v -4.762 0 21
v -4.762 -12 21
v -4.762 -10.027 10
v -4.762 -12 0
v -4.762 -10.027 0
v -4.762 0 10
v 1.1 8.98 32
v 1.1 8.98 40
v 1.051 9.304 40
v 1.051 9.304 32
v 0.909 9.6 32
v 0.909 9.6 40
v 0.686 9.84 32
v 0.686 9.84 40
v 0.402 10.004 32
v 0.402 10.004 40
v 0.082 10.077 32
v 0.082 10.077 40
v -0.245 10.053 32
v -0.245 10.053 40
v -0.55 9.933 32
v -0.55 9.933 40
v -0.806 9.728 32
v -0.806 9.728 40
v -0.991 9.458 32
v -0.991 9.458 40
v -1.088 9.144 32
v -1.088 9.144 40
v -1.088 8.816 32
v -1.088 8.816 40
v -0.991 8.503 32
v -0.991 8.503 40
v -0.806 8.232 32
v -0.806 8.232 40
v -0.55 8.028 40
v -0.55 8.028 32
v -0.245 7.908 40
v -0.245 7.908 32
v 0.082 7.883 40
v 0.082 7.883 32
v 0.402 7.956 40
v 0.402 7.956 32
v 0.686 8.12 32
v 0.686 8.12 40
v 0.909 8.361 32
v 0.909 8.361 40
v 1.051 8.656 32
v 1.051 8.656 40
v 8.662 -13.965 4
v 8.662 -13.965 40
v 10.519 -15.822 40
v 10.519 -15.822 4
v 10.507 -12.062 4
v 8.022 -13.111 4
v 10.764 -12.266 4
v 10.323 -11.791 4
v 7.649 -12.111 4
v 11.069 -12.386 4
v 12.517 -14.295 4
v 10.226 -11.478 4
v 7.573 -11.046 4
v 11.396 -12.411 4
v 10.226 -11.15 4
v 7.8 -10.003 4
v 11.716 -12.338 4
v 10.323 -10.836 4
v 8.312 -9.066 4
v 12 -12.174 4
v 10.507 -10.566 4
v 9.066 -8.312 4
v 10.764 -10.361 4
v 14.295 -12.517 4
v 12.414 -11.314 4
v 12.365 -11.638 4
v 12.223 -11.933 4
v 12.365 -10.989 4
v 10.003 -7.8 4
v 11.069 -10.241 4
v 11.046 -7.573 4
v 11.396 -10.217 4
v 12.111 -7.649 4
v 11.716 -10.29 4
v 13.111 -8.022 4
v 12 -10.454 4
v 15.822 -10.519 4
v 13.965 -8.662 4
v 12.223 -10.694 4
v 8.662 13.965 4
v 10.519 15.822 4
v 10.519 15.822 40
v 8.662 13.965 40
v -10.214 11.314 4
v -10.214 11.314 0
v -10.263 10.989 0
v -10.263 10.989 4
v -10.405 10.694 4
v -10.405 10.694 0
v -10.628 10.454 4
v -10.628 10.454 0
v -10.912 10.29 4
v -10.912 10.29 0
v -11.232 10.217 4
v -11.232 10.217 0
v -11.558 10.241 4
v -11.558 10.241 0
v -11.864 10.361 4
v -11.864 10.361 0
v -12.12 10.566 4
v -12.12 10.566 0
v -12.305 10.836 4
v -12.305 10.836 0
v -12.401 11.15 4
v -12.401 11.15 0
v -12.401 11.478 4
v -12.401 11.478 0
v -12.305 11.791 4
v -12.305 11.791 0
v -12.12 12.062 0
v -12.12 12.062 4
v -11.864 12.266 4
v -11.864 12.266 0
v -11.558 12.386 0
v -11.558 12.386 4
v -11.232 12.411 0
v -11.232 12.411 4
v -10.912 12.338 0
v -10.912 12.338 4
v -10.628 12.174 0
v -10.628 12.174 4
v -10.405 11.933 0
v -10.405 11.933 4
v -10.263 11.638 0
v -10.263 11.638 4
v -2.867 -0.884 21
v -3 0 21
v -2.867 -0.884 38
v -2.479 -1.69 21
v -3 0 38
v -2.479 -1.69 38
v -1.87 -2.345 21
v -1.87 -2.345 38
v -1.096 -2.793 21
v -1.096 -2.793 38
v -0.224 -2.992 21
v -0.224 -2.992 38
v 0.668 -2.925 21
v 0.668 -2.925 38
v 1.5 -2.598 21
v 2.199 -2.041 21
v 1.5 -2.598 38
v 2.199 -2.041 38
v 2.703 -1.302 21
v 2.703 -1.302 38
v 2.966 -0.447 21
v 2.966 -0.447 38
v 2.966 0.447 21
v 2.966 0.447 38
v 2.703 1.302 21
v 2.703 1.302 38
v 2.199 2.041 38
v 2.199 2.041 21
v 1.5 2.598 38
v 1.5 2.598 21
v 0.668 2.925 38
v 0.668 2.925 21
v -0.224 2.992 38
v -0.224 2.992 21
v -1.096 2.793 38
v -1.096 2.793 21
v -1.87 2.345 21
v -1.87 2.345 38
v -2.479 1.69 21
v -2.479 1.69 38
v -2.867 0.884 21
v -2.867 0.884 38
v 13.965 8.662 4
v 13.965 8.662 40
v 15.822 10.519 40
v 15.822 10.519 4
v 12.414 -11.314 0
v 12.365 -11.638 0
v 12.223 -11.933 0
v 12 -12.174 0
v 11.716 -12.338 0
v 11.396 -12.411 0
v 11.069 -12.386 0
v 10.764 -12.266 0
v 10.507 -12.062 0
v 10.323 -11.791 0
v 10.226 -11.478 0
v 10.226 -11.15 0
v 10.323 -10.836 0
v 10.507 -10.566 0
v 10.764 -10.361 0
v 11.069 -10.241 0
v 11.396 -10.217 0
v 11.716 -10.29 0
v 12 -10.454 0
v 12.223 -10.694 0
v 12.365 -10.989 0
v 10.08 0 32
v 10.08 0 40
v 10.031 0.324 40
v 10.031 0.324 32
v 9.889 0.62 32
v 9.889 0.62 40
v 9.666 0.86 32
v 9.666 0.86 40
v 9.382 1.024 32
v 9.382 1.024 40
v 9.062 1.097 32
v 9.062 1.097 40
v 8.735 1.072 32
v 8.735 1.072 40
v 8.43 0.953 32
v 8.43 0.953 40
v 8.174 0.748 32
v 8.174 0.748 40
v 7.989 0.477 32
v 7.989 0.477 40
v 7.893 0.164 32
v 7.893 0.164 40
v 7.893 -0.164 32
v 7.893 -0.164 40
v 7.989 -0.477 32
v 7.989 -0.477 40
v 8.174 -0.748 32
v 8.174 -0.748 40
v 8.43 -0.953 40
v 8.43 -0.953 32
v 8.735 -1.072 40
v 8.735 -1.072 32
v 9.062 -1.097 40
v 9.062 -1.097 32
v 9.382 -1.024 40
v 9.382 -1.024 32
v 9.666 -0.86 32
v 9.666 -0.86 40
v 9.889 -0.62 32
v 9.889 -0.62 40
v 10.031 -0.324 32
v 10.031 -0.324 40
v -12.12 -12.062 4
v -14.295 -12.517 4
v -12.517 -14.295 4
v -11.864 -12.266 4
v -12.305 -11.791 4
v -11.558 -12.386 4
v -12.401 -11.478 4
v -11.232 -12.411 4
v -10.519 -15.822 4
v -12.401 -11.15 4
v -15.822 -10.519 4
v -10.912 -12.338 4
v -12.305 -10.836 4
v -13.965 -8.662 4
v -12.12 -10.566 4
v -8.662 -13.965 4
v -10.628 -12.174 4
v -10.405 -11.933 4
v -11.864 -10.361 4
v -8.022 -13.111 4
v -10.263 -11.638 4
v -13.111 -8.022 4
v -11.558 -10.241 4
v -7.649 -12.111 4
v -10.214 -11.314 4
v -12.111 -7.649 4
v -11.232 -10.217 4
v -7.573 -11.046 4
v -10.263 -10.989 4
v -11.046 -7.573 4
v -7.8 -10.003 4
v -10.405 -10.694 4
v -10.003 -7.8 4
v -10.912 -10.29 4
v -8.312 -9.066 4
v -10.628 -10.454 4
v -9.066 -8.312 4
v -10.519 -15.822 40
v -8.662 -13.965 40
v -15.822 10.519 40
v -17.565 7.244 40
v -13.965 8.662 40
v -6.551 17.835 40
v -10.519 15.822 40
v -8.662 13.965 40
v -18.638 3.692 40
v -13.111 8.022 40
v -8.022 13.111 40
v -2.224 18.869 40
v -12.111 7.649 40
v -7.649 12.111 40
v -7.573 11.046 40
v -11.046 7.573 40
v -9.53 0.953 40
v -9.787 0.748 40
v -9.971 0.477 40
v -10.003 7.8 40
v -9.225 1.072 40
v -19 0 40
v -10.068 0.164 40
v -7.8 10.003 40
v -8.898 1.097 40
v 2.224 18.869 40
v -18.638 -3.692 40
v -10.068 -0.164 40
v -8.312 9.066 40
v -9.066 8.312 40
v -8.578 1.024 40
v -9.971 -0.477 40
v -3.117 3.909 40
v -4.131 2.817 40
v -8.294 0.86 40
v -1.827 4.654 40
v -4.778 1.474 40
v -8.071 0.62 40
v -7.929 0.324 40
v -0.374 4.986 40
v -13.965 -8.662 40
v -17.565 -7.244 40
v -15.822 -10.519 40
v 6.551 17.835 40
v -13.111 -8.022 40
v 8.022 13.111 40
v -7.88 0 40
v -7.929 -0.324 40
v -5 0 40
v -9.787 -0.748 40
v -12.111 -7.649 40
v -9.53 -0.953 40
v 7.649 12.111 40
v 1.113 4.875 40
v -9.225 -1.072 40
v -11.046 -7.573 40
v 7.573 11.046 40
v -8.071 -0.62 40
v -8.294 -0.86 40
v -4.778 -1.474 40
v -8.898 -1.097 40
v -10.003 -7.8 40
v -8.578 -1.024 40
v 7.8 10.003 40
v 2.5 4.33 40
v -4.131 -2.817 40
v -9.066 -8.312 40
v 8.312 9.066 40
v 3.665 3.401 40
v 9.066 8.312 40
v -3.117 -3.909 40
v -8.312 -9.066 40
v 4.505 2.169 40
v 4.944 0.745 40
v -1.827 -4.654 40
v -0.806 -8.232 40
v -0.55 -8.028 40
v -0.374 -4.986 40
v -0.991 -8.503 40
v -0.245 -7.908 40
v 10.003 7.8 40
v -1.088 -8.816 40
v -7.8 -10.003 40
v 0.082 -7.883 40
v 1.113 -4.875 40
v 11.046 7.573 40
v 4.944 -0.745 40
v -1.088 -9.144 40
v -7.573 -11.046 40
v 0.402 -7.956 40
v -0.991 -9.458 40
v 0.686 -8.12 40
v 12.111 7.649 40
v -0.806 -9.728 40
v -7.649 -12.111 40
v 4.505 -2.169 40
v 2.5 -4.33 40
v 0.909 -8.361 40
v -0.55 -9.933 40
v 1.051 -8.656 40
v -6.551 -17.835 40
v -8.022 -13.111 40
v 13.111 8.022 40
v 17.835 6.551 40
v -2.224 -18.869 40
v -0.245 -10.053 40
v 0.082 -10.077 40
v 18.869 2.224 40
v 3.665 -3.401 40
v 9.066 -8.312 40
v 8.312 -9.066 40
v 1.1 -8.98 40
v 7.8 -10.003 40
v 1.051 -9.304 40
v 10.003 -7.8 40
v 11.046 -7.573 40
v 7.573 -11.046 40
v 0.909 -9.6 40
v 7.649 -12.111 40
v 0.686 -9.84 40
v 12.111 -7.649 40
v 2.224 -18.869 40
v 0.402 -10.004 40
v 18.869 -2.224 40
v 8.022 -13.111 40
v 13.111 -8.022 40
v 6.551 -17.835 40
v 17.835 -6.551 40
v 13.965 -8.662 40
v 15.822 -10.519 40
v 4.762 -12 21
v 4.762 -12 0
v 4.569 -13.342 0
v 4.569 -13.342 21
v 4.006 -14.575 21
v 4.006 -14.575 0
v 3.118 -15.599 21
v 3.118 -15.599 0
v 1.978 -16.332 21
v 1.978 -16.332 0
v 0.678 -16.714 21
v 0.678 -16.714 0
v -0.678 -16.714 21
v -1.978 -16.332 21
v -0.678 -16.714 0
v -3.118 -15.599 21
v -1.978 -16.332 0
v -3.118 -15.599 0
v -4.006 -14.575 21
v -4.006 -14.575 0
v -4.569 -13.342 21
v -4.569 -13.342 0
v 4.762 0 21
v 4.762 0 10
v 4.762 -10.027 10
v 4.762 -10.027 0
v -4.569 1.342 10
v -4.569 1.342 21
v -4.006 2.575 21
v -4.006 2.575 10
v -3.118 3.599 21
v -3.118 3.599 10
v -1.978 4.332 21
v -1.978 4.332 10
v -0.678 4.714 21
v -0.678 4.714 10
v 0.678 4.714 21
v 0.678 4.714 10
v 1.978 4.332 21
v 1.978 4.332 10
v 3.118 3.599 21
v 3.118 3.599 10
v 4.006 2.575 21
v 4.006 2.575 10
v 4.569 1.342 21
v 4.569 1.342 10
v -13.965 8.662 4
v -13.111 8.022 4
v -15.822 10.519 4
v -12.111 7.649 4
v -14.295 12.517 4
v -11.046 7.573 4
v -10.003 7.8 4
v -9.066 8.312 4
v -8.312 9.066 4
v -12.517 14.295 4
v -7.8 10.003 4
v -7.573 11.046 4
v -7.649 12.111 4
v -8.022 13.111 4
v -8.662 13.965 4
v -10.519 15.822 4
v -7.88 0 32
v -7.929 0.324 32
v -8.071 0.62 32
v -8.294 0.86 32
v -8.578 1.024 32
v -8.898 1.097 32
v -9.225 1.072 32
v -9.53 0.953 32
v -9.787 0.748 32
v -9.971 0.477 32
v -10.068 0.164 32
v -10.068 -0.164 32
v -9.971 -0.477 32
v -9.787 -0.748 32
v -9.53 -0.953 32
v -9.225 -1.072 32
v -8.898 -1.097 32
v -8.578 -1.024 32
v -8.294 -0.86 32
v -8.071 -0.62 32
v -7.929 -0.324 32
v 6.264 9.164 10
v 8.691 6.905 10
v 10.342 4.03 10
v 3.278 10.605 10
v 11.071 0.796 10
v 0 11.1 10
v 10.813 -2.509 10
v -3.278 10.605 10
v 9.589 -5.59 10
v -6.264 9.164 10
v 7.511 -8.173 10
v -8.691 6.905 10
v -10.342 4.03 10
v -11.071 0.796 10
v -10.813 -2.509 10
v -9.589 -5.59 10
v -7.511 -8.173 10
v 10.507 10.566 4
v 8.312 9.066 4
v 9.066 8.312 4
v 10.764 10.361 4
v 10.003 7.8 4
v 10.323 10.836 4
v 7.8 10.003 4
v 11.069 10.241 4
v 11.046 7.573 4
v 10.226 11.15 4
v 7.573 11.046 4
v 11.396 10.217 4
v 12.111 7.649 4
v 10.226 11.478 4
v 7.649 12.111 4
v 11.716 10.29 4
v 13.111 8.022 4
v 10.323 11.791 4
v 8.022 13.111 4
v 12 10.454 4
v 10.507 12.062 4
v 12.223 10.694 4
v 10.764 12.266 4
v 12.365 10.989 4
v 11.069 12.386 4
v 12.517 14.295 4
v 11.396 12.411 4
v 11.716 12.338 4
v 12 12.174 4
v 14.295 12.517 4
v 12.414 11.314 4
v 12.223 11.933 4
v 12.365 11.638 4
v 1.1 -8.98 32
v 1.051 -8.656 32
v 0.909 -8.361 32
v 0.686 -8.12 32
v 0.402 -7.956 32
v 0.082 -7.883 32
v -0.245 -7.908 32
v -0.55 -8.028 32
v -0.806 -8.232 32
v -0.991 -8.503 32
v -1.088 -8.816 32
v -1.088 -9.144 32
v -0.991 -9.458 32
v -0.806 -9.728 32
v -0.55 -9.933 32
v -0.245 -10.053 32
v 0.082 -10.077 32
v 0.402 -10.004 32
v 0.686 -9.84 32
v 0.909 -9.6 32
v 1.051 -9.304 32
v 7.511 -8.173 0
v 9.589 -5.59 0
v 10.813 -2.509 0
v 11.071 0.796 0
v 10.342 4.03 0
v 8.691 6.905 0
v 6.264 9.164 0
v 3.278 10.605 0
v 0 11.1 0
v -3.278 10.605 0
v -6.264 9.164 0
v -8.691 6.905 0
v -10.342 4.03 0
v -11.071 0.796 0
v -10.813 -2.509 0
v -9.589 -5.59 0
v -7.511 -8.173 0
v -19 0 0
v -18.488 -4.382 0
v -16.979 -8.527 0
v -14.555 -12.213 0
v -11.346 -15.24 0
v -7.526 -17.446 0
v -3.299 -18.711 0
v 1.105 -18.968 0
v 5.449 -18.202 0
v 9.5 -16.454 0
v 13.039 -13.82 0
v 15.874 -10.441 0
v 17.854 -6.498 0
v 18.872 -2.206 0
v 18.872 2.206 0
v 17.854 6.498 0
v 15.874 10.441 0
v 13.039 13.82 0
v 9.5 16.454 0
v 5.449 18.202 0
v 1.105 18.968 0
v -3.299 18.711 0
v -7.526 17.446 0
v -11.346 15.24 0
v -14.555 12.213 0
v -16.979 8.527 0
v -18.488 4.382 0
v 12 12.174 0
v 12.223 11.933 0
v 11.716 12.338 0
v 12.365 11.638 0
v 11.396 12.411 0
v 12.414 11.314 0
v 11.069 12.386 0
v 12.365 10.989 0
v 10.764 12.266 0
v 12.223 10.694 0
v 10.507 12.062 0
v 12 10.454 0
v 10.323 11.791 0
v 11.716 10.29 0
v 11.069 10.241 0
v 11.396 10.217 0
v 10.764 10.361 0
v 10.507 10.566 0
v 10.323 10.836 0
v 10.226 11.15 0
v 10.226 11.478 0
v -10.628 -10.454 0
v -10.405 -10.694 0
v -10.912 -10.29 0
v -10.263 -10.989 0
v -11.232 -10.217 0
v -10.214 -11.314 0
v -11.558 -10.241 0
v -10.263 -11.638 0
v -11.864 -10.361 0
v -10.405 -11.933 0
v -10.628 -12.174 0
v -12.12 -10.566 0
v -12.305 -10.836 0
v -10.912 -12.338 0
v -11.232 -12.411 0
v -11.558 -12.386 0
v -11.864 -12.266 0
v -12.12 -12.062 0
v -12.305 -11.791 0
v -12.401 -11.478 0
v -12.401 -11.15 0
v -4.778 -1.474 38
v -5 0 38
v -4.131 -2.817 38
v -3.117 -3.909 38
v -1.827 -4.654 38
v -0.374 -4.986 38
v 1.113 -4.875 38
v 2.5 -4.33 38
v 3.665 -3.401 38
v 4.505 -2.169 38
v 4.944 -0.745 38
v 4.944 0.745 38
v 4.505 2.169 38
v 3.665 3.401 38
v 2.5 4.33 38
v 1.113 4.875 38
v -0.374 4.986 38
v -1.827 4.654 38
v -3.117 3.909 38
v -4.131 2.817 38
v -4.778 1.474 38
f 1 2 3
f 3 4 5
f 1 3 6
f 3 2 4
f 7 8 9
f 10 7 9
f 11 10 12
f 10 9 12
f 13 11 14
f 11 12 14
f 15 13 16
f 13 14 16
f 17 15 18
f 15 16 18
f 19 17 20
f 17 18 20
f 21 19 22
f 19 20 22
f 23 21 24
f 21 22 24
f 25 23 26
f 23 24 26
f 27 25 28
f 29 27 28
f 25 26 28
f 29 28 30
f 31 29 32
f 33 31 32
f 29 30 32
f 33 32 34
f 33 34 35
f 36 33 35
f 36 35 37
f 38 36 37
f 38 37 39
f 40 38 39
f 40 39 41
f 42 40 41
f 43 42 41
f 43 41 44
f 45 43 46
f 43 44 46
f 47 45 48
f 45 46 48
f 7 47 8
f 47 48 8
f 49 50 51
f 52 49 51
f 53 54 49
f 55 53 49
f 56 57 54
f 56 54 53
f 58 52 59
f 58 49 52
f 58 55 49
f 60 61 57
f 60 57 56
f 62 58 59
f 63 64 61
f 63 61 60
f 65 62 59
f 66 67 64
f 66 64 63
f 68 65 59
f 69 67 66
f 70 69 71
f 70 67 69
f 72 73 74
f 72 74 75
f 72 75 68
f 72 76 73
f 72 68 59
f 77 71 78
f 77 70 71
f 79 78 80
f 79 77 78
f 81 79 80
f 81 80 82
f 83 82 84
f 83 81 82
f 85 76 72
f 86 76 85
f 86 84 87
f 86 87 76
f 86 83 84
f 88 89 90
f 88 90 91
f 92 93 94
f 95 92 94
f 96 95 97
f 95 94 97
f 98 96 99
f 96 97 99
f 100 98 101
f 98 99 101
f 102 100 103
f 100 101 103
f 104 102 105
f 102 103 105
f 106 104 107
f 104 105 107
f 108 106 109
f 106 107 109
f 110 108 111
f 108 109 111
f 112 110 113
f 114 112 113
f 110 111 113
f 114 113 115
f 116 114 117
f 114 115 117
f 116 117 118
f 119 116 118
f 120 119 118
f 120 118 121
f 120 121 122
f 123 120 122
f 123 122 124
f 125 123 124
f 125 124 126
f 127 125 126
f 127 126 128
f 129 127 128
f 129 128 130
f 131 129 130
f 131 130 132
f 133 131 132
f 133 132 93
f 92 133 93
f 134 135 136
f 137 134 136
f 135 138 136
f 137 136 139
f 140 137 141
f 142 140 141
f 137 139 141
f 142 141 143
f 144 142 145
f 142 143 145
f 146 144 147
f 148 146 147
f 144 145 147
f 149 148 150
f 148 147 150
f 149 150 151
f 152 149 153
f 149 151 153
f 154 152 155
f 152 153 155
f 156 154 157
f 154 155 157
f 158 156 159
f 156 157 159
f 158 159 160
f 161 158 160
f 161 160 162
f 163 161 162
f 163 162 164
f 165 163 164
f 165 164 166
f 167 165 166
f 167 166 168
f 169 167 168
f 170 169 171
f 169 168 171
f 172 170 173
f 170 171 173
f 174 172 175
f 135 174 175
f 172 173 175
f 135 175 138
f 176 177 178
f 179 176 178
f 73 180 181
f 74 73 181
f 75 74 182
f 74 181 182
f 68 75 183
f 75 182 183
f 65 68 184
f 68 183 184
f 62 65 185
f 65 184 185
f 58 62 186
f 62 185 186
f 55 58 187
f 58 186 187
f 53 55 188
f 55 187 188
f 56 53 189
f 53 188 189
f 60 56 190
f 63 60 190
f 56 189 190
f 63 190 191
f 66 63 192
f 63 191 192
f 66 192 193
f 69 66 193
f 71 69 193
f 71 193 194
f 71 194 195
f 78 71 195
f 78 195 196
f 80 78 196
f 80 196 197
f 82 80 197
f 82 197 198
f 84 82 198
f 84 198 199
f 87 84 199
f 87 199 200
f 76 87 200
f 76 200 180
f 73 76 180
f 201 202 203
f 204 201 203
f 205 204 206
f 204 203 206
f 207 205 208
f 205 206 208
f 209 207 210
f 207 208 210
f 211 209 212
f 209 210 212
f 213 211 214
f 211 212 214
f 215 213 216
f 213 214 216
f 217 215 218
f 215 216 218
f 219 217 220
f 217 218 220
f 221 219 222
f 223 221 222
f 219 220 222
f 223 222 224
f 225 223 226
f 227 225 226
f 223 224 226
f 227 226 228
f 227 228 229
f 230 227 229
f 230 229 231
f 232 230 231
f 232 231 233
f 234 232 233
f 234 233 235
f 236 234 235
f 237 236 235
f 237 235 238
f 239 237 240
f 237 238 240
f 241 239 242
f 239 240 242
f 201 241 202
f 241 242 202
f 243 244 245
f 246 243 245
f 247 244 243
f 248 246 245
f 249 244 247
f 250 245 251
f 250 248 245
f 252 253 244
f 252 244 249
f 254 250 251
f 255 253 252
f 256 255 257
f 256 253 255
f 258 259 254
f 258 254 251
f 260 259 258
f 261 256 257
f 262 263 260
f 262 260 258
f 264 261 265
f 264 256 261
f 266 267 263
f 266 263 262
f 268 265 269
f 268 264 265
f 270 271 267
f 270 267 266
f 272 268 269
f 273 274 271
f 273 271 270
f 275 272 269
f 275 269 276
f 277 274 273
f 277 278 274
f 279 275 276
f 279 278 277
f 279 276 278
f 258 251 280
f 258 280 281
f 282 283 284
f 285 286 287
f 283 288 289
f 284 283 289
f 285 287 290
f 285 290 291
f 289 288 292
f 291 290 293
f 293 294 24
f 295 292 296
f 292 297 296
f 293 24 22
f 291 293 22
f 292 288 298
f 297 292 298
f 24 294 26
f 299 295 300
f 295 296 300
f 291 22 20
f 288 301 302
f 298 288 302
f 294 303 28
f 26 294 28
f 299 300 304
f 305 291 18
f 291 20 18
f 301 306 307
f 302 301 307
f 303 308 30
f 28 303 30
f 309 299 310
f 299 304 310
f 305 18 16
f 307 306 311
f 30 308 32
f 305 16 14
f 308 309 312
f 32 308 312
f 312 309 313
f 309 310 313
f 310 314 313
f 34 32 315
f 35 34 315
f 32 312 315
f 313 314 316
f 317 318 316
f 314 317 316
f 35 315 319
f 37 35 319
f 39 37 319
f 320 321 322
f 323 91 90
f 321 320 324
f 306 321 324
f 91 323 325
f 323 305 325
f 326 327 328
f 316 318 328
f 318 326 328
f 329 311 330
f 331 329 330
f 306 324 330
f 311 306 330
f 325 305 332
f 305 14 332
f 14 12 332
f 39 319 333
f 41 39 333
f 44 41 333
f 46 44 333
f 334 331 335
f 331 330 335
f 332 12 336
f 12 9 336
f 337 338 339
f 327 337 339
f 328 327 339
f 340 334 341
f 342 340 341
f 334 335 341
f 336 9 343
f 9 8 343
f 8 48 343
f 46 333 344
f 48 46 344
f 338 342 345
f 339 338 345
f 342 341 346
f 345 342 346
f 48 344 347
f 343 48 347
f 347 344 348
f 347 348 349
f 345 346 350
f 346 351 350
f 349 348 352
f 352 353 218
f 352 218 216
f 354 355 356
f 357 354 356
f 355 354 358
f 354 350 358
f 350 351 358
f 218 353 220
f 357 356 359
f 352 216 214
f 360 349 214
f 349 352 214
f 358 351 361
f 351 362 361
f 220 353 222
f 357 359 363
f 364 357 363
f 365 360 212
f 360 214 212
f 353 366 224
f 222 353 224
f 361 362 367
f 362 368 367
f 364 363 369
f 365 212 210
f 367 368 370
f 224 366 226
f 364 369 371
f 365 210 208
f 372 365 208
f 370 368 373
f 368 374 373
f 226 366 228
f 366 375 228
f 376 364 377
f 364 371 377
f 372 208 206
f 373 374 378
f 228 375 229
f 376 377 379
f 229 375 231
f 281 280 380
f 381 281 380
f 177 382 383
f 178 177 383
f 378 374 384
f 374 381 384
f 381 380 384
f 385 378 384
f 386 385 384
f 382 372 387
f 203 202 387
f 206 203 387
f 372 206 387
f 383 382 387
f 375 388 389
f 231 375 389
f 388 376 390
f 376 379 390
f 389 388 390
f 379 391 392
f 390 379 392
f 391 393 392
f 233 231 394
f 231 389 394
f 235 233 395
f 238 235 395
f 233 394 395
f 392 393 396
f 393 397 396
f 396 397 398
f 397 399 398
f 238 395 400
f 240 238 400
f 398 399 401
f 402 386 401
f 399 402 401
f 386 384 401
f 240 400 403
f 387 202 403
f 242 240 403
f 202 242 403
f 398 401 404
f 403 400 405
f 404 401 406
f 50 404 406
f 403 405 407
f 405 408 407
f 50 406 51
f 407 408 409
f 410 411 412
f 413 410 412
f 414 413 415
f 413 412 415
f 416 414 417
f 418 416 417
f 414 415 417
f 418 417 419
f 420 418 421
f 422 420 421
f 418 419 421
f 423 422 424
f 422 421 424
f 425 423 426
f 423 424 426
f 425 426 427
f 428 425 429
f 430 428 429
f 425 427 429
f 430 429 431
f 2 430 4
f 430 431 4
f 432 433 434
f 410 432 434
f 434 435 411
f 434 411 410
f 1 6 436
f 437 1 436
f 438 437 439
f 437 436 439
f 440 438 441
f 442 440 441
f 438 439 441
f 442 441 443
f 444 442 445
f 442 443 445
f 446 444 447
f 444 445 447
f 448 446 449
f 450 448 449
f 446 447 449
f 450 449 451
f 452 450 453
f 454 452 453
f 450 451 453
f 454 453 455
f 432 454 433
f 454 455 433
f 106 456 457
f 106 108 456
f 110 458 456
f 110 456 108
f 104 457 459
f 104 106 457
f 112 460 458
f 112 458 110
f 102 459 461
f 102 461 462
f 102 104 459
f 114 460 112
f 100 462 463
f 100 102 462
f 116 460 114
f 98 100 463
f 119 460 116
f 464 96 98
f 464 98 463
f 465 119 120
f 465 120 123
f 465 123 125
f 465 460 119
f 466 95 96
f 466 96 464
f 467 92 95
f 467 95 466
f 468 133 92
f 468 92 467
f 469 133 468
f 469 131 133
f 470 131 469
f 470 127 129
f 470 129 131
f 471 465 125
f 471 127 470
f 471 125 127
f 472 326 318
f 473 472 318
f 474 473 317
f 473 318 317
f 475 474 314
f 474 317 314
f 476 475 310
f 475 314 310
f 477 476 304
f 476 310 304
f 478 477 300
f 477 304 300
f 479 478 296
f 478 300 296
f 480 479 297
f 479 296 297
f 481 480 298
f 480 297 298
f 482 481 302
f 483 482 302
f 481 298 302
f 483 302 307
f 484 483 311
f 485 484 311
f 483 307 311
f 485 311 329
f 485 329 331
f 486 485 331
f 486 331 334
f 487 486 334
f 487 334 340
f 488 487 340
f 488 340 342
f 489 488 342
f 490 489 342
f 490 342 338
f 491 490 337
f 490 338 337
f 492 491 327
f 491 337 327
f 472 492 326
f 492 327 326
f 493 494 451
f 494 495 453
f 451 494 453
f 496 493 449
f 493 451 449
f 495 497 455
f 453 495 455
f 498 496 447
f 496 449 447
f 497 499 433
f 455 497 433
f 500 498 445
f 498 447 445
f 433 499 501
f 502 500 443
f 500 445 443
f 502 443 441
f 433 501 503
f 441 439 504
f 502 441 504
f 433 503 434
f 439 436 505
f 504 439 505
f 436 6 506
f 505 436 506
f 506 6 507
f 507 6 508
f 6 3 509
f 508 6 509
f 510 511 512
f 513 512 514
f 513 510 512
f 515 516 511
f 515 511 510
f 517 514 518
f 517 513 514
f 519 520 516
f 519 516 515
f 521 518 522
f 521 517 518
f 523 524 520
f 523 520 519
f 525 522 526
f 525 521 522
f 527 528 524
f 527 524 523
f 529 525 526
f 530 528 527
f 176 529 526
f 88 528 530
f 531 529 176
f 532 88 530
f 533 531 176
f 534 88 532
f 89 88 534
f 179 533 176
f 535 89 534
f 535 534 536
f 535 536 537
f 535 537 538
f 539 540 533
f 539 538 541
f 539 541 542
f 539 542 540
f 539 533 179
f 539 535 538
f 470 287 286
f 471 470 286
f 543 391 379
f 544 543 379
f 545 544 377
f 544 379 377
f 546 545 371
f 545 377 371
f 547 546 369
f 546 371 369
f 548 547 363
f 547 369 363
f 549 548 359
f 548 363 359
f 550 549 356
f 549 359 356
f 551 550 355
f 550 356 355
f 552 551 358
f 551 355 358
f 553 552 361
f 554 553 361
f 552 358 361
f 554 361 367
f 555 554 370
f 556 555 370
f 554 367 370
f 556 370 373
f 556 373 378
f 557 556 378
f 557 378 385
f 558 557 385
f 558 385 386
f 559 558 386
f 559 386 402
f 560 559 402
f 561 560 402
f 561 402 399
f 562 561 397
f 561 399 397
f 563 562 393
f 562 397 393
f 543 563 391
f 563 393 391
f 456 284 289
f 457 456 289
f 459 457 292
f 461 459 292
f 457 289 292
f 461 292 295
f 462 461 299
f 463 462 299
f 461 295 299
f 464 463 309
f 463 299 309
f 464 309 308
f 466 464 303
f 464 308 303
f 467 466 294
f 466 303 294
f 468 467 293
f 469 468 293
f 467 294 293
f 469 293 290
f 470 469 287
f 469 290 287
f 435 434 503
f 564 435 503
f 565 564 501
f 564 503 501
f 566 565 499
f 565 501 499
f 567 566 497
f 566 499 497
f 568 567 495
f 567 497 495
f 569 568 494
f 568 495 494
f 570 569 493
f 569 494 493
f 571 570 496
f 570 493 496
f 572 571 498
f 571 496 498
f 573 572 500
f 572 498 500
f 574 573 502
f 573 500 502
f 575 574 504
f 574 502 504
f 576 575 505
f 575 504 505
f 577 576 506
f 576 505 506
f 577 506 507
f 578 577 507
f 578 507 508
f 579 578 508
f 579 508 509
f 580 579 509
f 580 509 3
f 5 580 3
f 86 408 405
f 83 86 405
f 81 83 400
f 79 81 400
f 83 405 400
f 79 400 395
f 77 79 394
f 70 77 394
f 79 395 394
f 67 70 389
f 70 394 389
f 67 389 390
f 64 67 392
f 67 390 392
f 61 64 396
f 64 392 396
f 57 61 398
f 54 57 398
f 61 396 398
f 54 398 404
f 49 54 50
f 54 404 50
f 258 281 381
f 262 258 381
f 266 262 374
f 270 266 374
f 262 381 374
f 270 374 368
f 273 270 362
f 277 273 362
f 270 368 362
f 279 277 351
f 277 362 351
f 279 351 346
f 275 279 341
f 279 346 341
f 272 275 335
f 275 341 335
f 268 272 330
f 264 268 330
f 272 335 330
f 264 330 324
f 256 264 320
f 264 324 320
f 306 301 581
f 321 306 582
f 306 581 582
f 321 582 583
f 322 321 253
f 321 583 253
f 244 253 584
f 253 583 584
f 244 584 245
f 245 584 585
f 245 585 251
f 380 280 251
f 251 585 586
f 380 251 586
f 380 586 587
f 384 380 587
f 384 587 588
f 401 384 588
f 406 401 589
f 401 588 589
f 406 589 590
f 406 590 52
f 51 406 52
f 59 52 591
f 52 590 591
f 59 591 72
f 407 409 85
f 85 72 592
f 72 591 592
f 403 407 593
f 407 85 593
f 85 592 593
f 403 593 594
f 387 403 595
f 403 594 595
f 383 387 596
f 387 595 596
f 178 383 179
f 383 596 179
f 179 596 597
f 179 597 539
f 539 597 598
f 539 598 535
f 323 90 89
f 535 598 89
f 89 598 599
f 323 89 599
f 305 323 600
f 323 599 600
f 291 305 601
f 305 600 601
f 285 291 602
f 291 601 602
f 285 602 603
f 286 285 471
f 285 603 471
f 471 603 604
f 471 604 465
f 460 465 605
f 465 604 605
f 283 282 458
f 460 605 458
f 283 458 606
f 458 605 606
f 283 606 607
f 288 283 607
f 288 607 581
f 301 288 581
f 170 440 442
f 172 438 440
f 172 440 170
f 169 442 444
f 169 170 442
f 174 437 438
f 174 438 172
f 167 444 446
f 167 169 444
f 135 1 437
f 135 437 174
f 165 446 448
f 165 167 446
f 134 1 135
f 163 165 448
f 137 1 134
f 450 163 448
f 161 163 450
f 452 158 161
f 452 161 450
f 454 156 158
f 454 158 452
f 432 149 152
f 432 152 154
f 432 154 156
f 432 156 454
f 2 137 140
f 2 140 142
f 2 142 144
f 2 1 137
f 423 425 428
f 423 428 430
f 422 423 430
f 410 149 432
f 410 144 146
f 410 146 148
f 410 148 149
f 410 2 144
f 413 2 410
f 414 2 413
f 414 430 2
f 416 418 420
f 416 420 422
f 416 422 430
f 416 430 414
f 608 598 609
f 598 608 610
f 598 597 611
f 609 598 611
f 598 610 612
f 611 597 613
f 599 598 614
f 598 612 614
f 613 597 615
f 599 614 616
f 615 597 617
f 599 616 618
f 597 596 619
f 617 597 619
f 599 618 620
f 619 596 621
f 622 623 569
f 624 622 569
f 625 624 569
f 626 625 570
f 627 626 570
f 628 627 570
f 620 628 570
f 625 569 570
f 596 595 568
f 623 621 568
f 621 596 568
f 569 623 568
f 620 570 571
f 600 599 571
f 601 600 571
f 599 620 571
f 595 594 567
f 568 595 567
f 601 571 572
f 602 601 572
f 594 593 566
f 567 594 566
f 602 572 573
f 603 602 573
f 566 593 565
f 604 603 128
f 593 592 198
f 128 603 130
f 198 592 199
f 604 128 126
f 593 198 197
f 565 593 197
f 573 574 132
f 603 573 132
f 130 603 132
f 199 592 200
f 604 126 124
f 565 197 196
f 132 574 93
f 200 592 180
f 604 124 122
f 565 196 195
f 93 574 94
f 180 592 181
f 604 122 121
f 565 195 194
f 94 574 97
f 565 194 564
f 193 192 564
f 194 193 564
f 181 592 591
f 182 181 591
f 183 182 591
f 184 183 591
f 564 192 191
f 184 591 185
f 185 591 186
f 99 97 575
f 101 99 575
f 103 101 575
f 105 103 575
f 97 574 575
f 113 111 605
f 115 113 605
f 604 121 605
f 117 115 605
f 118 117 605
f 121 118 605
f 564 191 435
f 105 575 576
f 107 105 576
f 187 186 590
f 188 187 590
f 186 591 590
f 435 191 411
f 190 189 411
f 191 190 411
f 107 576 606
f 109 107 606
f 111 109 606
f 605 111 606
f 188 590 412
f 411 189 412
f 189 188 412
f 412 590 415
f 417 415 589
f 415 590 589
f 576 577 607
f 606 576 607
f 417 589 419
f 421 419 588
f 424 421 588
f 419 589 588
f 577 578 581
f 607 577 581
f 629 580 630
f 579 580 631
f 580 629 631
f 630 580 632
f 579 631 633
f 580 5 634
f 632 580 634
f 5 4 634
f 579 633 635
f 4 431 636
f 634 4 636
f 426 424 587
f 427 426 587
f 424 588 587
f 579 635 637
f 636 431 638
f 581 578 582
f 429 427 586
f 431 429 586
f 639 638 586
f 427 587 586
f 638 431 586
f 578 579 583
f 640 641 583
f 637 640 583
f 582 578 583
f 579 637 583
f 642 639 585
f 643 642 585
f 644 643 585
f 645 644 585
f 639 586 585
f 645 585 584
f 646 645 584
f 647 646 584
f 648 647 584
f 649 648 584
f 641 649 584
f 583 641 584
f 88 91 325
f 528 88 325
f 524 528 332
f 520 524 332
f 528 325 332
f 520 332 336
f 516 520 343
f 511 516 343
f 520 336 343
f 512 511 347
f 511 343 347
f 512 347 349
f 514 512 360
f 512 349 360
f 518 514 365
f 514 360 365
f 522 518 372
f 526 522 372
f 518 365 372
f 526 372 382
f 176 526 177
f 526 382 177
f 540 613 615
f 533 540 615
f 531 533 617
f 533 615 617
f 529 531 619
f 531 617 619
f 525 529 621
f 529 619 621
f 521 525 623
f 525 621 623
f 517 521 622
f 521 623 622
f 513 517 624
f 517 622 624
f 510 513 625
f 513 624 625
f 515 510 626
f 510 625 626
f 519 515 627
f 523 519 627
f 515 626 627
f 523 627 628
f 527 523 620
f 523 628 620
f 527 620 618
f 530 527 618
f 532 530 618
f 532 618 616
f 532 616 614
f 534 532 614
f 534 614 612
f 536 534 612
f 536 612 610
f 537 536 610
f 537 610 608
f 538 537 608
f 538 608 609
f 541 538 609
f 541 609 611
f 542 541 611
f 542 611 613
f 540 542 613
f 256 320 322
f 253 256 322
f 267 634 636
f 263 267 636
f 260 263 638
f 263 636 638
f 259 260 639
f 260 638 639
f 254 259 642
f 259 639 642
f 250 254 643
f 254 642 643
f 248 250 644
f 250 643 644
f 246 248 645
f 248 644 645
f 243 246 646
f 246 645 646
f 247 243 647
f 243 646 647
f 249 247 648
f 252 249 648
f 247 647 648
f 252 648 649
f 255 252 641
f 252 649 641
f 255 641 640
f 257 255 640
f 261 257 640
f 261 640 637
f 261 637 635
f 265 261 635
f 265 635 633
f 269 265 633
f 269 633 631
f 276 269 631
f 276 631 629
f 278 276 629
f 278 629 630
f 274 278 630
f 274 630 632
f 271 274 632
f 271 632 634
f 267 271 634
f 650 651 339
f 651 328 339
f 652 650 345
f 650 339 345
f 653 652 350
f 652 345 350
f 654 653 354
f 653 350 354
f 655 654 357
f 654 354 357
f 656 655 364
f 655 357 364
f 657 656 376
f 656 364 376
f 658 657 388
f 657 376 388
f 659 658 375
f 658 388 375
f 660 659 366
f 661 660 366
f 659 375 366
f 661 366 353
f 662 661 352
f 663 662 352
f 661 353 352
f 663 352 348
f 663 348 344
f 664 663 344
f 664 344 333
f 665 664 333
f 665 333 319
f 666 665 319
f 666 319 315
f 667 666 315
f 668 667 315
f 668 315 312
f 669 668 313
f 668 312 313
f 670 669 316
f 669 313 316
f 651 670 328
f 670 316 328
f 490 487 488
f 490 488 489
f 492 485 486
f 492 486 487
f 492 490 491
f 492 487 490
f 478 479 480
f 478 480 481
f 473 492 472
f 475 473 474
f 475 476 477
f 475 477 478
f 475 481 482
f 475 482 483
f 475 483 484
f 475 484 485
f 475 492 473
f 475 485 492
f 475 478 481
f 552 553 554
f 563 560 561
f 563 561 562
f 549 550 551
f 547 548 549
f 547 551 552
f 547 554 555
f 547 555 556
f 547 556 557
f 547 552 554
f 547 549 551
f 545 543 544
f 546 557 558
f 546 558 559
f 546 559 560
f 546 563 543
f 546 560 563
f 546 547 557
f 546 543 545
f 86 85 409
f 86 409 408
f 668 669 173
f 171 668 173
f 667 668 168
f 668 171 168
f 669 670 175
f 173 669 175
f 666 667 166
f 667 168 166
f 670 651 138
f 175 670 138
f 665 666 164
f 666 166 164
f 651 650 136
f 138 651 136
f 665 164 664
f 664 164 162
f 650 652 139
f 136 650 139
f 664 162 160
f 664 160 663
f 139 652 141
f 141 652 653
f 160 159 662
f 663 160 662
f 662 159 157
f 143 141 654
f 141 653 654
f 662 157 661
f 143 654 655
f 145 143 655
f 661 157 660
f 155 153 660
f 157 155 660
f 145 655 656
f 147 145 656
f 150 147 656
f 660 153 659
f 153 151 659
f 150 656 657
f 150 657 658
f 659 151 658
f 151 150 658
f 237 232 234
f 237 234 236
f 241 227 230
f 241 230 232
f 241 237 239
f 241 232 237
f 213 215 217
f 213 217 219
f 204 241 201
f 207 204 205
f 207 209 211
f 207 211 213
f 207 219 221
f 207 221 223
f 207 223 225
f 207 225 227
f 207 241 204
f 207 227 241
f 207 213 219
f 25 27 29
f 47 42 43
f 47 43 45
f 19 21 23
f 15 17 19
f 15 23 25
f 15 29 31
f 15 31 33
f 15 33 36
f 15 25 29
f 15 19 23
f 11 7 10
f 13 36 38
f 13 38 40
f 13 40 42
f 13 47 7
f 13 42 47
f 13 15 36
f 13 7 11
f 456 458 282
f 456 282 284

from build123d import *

# Parameters (mm, degrees)
F3_DEPTH = 36
F4_R     = 1.1
F5_DEPTH = 8
F6_R     = 1.1
F7_DEPTH = 21


with BuildPart() as f1:
    # F0 (on Front) → F1 (revolve)
    with BuildSketch(Plane.XZ):
        Polygon((-19, 0), (-11.1, 0), (-11.1, 10), (0, 10), (0, 21), (-3, 21), (-3, 38), (-5, 38), (-5, 40), (-19, 40), align=None)
    revolve(axis=Axis((0, 0, 15.5), (0, 0, 1)))

    # F2 (on face) → F3 (cut)
    with BuildSketch(Plane.XY.offset(40)):
        with BuildLine():
            Line((11.490485, 16.793786), (8.662058, 13.965359))
            ThreePointArc((8.662058, 13.965359), (8.662058, 8.662058), (13.965359, 8.662058))
            Line((13.965359, 8.662058), (16.793786, 11.490485))
            Line((16.793786, 11.490485), (11.490485, 16.793786))
        make_face()
        with BuildLine():
            Line((-16.793786, 11.490485), (-13.965359, 8.662058))
            ThreePointArc((-13.965359, 8.662058), (-8.662058, 8.662058), (-8.662058, 13.965359))
            Line((-8.662058, 13.965359), (-11.490485, 16.793786))
            Line((-11.490485, 16.793786), (-16.793786, 11.490485))
        make_face()
        with BuildLine():
            Line((-11.490485, -16.793786), (-8.662058, -13.965359))
            ThreePointArc((-8.662058, -13.965359), (-8.662058, -8.662058), (-13.965359, -8.662058))
            Line((-13.965359, -8.662058), (-16.793786, -11.490485))
            Line((-16.793786, -11.490485), (-11.490485, -16.793786))
        make_face()
        with BuildLine():
            Line((16.793786, -11.490485), (13.965359, -8.662058))
            ThreePointArc((13.965359, -8.662058), (8.662058, -8.662058), (8.662058, -13.965359))
            Line((8.662058, -13.965359), (11.490485, -16.793786))
            Line((11.490485, -16.793786), (16.793786, -11.490485))
        make_face()
    extrude(amount=-F3_DEPTH, mode=Mode.SUBTRACT)

    # F4 (on face) → F5 (cut)
    with BuildSketch(Plane.XY.offset(40)):
        with Locations((0, 8.980256)):
            Circle(F4_R)
        with Locations((8.980256, 0)):
            Circle(F4_R)
        with Locations((0, -8.980256)):
            Circle(F4_R)
        with Locations((-8.980256, 0)):
            Circle(F4_R)
    extrude(amount=-F5_DEPTH, mode=Mode.SUBTRACT)

    # F6 (on face) → F7 (cut)
    with BuildSketch(Plane(origin=(0, 0, 0), x_dir=(1, 0, 0), z_dir=(0, 0, -1))):
        with Locations((11.313708, 11.313708)):
            Circle(F6_R)
        with Locations((-11.313708, 11.313708)):
            Circle(F6_R)
        with Locations((-11.313708, -11.313708)):
            Circle(F6_R)
        with Locations((11.313708, -11.313708)):
            Circle(F6_R)
        with BuildLine():
            Line((-4.762, 12), (-4.762, 0))
            ThreePointArc((-4.762, 0), (0, -4.762), (4.762, 0))
            Line((4.762, 0), (4.762, 12))
            ThreePointArc((4.762, 12), (0, 16.762), (-4.762, 12))
        make_face()
    extrude(amount=-F7_DEPTH, mode=Mode.SUBTRACT)


solid = f1.part
